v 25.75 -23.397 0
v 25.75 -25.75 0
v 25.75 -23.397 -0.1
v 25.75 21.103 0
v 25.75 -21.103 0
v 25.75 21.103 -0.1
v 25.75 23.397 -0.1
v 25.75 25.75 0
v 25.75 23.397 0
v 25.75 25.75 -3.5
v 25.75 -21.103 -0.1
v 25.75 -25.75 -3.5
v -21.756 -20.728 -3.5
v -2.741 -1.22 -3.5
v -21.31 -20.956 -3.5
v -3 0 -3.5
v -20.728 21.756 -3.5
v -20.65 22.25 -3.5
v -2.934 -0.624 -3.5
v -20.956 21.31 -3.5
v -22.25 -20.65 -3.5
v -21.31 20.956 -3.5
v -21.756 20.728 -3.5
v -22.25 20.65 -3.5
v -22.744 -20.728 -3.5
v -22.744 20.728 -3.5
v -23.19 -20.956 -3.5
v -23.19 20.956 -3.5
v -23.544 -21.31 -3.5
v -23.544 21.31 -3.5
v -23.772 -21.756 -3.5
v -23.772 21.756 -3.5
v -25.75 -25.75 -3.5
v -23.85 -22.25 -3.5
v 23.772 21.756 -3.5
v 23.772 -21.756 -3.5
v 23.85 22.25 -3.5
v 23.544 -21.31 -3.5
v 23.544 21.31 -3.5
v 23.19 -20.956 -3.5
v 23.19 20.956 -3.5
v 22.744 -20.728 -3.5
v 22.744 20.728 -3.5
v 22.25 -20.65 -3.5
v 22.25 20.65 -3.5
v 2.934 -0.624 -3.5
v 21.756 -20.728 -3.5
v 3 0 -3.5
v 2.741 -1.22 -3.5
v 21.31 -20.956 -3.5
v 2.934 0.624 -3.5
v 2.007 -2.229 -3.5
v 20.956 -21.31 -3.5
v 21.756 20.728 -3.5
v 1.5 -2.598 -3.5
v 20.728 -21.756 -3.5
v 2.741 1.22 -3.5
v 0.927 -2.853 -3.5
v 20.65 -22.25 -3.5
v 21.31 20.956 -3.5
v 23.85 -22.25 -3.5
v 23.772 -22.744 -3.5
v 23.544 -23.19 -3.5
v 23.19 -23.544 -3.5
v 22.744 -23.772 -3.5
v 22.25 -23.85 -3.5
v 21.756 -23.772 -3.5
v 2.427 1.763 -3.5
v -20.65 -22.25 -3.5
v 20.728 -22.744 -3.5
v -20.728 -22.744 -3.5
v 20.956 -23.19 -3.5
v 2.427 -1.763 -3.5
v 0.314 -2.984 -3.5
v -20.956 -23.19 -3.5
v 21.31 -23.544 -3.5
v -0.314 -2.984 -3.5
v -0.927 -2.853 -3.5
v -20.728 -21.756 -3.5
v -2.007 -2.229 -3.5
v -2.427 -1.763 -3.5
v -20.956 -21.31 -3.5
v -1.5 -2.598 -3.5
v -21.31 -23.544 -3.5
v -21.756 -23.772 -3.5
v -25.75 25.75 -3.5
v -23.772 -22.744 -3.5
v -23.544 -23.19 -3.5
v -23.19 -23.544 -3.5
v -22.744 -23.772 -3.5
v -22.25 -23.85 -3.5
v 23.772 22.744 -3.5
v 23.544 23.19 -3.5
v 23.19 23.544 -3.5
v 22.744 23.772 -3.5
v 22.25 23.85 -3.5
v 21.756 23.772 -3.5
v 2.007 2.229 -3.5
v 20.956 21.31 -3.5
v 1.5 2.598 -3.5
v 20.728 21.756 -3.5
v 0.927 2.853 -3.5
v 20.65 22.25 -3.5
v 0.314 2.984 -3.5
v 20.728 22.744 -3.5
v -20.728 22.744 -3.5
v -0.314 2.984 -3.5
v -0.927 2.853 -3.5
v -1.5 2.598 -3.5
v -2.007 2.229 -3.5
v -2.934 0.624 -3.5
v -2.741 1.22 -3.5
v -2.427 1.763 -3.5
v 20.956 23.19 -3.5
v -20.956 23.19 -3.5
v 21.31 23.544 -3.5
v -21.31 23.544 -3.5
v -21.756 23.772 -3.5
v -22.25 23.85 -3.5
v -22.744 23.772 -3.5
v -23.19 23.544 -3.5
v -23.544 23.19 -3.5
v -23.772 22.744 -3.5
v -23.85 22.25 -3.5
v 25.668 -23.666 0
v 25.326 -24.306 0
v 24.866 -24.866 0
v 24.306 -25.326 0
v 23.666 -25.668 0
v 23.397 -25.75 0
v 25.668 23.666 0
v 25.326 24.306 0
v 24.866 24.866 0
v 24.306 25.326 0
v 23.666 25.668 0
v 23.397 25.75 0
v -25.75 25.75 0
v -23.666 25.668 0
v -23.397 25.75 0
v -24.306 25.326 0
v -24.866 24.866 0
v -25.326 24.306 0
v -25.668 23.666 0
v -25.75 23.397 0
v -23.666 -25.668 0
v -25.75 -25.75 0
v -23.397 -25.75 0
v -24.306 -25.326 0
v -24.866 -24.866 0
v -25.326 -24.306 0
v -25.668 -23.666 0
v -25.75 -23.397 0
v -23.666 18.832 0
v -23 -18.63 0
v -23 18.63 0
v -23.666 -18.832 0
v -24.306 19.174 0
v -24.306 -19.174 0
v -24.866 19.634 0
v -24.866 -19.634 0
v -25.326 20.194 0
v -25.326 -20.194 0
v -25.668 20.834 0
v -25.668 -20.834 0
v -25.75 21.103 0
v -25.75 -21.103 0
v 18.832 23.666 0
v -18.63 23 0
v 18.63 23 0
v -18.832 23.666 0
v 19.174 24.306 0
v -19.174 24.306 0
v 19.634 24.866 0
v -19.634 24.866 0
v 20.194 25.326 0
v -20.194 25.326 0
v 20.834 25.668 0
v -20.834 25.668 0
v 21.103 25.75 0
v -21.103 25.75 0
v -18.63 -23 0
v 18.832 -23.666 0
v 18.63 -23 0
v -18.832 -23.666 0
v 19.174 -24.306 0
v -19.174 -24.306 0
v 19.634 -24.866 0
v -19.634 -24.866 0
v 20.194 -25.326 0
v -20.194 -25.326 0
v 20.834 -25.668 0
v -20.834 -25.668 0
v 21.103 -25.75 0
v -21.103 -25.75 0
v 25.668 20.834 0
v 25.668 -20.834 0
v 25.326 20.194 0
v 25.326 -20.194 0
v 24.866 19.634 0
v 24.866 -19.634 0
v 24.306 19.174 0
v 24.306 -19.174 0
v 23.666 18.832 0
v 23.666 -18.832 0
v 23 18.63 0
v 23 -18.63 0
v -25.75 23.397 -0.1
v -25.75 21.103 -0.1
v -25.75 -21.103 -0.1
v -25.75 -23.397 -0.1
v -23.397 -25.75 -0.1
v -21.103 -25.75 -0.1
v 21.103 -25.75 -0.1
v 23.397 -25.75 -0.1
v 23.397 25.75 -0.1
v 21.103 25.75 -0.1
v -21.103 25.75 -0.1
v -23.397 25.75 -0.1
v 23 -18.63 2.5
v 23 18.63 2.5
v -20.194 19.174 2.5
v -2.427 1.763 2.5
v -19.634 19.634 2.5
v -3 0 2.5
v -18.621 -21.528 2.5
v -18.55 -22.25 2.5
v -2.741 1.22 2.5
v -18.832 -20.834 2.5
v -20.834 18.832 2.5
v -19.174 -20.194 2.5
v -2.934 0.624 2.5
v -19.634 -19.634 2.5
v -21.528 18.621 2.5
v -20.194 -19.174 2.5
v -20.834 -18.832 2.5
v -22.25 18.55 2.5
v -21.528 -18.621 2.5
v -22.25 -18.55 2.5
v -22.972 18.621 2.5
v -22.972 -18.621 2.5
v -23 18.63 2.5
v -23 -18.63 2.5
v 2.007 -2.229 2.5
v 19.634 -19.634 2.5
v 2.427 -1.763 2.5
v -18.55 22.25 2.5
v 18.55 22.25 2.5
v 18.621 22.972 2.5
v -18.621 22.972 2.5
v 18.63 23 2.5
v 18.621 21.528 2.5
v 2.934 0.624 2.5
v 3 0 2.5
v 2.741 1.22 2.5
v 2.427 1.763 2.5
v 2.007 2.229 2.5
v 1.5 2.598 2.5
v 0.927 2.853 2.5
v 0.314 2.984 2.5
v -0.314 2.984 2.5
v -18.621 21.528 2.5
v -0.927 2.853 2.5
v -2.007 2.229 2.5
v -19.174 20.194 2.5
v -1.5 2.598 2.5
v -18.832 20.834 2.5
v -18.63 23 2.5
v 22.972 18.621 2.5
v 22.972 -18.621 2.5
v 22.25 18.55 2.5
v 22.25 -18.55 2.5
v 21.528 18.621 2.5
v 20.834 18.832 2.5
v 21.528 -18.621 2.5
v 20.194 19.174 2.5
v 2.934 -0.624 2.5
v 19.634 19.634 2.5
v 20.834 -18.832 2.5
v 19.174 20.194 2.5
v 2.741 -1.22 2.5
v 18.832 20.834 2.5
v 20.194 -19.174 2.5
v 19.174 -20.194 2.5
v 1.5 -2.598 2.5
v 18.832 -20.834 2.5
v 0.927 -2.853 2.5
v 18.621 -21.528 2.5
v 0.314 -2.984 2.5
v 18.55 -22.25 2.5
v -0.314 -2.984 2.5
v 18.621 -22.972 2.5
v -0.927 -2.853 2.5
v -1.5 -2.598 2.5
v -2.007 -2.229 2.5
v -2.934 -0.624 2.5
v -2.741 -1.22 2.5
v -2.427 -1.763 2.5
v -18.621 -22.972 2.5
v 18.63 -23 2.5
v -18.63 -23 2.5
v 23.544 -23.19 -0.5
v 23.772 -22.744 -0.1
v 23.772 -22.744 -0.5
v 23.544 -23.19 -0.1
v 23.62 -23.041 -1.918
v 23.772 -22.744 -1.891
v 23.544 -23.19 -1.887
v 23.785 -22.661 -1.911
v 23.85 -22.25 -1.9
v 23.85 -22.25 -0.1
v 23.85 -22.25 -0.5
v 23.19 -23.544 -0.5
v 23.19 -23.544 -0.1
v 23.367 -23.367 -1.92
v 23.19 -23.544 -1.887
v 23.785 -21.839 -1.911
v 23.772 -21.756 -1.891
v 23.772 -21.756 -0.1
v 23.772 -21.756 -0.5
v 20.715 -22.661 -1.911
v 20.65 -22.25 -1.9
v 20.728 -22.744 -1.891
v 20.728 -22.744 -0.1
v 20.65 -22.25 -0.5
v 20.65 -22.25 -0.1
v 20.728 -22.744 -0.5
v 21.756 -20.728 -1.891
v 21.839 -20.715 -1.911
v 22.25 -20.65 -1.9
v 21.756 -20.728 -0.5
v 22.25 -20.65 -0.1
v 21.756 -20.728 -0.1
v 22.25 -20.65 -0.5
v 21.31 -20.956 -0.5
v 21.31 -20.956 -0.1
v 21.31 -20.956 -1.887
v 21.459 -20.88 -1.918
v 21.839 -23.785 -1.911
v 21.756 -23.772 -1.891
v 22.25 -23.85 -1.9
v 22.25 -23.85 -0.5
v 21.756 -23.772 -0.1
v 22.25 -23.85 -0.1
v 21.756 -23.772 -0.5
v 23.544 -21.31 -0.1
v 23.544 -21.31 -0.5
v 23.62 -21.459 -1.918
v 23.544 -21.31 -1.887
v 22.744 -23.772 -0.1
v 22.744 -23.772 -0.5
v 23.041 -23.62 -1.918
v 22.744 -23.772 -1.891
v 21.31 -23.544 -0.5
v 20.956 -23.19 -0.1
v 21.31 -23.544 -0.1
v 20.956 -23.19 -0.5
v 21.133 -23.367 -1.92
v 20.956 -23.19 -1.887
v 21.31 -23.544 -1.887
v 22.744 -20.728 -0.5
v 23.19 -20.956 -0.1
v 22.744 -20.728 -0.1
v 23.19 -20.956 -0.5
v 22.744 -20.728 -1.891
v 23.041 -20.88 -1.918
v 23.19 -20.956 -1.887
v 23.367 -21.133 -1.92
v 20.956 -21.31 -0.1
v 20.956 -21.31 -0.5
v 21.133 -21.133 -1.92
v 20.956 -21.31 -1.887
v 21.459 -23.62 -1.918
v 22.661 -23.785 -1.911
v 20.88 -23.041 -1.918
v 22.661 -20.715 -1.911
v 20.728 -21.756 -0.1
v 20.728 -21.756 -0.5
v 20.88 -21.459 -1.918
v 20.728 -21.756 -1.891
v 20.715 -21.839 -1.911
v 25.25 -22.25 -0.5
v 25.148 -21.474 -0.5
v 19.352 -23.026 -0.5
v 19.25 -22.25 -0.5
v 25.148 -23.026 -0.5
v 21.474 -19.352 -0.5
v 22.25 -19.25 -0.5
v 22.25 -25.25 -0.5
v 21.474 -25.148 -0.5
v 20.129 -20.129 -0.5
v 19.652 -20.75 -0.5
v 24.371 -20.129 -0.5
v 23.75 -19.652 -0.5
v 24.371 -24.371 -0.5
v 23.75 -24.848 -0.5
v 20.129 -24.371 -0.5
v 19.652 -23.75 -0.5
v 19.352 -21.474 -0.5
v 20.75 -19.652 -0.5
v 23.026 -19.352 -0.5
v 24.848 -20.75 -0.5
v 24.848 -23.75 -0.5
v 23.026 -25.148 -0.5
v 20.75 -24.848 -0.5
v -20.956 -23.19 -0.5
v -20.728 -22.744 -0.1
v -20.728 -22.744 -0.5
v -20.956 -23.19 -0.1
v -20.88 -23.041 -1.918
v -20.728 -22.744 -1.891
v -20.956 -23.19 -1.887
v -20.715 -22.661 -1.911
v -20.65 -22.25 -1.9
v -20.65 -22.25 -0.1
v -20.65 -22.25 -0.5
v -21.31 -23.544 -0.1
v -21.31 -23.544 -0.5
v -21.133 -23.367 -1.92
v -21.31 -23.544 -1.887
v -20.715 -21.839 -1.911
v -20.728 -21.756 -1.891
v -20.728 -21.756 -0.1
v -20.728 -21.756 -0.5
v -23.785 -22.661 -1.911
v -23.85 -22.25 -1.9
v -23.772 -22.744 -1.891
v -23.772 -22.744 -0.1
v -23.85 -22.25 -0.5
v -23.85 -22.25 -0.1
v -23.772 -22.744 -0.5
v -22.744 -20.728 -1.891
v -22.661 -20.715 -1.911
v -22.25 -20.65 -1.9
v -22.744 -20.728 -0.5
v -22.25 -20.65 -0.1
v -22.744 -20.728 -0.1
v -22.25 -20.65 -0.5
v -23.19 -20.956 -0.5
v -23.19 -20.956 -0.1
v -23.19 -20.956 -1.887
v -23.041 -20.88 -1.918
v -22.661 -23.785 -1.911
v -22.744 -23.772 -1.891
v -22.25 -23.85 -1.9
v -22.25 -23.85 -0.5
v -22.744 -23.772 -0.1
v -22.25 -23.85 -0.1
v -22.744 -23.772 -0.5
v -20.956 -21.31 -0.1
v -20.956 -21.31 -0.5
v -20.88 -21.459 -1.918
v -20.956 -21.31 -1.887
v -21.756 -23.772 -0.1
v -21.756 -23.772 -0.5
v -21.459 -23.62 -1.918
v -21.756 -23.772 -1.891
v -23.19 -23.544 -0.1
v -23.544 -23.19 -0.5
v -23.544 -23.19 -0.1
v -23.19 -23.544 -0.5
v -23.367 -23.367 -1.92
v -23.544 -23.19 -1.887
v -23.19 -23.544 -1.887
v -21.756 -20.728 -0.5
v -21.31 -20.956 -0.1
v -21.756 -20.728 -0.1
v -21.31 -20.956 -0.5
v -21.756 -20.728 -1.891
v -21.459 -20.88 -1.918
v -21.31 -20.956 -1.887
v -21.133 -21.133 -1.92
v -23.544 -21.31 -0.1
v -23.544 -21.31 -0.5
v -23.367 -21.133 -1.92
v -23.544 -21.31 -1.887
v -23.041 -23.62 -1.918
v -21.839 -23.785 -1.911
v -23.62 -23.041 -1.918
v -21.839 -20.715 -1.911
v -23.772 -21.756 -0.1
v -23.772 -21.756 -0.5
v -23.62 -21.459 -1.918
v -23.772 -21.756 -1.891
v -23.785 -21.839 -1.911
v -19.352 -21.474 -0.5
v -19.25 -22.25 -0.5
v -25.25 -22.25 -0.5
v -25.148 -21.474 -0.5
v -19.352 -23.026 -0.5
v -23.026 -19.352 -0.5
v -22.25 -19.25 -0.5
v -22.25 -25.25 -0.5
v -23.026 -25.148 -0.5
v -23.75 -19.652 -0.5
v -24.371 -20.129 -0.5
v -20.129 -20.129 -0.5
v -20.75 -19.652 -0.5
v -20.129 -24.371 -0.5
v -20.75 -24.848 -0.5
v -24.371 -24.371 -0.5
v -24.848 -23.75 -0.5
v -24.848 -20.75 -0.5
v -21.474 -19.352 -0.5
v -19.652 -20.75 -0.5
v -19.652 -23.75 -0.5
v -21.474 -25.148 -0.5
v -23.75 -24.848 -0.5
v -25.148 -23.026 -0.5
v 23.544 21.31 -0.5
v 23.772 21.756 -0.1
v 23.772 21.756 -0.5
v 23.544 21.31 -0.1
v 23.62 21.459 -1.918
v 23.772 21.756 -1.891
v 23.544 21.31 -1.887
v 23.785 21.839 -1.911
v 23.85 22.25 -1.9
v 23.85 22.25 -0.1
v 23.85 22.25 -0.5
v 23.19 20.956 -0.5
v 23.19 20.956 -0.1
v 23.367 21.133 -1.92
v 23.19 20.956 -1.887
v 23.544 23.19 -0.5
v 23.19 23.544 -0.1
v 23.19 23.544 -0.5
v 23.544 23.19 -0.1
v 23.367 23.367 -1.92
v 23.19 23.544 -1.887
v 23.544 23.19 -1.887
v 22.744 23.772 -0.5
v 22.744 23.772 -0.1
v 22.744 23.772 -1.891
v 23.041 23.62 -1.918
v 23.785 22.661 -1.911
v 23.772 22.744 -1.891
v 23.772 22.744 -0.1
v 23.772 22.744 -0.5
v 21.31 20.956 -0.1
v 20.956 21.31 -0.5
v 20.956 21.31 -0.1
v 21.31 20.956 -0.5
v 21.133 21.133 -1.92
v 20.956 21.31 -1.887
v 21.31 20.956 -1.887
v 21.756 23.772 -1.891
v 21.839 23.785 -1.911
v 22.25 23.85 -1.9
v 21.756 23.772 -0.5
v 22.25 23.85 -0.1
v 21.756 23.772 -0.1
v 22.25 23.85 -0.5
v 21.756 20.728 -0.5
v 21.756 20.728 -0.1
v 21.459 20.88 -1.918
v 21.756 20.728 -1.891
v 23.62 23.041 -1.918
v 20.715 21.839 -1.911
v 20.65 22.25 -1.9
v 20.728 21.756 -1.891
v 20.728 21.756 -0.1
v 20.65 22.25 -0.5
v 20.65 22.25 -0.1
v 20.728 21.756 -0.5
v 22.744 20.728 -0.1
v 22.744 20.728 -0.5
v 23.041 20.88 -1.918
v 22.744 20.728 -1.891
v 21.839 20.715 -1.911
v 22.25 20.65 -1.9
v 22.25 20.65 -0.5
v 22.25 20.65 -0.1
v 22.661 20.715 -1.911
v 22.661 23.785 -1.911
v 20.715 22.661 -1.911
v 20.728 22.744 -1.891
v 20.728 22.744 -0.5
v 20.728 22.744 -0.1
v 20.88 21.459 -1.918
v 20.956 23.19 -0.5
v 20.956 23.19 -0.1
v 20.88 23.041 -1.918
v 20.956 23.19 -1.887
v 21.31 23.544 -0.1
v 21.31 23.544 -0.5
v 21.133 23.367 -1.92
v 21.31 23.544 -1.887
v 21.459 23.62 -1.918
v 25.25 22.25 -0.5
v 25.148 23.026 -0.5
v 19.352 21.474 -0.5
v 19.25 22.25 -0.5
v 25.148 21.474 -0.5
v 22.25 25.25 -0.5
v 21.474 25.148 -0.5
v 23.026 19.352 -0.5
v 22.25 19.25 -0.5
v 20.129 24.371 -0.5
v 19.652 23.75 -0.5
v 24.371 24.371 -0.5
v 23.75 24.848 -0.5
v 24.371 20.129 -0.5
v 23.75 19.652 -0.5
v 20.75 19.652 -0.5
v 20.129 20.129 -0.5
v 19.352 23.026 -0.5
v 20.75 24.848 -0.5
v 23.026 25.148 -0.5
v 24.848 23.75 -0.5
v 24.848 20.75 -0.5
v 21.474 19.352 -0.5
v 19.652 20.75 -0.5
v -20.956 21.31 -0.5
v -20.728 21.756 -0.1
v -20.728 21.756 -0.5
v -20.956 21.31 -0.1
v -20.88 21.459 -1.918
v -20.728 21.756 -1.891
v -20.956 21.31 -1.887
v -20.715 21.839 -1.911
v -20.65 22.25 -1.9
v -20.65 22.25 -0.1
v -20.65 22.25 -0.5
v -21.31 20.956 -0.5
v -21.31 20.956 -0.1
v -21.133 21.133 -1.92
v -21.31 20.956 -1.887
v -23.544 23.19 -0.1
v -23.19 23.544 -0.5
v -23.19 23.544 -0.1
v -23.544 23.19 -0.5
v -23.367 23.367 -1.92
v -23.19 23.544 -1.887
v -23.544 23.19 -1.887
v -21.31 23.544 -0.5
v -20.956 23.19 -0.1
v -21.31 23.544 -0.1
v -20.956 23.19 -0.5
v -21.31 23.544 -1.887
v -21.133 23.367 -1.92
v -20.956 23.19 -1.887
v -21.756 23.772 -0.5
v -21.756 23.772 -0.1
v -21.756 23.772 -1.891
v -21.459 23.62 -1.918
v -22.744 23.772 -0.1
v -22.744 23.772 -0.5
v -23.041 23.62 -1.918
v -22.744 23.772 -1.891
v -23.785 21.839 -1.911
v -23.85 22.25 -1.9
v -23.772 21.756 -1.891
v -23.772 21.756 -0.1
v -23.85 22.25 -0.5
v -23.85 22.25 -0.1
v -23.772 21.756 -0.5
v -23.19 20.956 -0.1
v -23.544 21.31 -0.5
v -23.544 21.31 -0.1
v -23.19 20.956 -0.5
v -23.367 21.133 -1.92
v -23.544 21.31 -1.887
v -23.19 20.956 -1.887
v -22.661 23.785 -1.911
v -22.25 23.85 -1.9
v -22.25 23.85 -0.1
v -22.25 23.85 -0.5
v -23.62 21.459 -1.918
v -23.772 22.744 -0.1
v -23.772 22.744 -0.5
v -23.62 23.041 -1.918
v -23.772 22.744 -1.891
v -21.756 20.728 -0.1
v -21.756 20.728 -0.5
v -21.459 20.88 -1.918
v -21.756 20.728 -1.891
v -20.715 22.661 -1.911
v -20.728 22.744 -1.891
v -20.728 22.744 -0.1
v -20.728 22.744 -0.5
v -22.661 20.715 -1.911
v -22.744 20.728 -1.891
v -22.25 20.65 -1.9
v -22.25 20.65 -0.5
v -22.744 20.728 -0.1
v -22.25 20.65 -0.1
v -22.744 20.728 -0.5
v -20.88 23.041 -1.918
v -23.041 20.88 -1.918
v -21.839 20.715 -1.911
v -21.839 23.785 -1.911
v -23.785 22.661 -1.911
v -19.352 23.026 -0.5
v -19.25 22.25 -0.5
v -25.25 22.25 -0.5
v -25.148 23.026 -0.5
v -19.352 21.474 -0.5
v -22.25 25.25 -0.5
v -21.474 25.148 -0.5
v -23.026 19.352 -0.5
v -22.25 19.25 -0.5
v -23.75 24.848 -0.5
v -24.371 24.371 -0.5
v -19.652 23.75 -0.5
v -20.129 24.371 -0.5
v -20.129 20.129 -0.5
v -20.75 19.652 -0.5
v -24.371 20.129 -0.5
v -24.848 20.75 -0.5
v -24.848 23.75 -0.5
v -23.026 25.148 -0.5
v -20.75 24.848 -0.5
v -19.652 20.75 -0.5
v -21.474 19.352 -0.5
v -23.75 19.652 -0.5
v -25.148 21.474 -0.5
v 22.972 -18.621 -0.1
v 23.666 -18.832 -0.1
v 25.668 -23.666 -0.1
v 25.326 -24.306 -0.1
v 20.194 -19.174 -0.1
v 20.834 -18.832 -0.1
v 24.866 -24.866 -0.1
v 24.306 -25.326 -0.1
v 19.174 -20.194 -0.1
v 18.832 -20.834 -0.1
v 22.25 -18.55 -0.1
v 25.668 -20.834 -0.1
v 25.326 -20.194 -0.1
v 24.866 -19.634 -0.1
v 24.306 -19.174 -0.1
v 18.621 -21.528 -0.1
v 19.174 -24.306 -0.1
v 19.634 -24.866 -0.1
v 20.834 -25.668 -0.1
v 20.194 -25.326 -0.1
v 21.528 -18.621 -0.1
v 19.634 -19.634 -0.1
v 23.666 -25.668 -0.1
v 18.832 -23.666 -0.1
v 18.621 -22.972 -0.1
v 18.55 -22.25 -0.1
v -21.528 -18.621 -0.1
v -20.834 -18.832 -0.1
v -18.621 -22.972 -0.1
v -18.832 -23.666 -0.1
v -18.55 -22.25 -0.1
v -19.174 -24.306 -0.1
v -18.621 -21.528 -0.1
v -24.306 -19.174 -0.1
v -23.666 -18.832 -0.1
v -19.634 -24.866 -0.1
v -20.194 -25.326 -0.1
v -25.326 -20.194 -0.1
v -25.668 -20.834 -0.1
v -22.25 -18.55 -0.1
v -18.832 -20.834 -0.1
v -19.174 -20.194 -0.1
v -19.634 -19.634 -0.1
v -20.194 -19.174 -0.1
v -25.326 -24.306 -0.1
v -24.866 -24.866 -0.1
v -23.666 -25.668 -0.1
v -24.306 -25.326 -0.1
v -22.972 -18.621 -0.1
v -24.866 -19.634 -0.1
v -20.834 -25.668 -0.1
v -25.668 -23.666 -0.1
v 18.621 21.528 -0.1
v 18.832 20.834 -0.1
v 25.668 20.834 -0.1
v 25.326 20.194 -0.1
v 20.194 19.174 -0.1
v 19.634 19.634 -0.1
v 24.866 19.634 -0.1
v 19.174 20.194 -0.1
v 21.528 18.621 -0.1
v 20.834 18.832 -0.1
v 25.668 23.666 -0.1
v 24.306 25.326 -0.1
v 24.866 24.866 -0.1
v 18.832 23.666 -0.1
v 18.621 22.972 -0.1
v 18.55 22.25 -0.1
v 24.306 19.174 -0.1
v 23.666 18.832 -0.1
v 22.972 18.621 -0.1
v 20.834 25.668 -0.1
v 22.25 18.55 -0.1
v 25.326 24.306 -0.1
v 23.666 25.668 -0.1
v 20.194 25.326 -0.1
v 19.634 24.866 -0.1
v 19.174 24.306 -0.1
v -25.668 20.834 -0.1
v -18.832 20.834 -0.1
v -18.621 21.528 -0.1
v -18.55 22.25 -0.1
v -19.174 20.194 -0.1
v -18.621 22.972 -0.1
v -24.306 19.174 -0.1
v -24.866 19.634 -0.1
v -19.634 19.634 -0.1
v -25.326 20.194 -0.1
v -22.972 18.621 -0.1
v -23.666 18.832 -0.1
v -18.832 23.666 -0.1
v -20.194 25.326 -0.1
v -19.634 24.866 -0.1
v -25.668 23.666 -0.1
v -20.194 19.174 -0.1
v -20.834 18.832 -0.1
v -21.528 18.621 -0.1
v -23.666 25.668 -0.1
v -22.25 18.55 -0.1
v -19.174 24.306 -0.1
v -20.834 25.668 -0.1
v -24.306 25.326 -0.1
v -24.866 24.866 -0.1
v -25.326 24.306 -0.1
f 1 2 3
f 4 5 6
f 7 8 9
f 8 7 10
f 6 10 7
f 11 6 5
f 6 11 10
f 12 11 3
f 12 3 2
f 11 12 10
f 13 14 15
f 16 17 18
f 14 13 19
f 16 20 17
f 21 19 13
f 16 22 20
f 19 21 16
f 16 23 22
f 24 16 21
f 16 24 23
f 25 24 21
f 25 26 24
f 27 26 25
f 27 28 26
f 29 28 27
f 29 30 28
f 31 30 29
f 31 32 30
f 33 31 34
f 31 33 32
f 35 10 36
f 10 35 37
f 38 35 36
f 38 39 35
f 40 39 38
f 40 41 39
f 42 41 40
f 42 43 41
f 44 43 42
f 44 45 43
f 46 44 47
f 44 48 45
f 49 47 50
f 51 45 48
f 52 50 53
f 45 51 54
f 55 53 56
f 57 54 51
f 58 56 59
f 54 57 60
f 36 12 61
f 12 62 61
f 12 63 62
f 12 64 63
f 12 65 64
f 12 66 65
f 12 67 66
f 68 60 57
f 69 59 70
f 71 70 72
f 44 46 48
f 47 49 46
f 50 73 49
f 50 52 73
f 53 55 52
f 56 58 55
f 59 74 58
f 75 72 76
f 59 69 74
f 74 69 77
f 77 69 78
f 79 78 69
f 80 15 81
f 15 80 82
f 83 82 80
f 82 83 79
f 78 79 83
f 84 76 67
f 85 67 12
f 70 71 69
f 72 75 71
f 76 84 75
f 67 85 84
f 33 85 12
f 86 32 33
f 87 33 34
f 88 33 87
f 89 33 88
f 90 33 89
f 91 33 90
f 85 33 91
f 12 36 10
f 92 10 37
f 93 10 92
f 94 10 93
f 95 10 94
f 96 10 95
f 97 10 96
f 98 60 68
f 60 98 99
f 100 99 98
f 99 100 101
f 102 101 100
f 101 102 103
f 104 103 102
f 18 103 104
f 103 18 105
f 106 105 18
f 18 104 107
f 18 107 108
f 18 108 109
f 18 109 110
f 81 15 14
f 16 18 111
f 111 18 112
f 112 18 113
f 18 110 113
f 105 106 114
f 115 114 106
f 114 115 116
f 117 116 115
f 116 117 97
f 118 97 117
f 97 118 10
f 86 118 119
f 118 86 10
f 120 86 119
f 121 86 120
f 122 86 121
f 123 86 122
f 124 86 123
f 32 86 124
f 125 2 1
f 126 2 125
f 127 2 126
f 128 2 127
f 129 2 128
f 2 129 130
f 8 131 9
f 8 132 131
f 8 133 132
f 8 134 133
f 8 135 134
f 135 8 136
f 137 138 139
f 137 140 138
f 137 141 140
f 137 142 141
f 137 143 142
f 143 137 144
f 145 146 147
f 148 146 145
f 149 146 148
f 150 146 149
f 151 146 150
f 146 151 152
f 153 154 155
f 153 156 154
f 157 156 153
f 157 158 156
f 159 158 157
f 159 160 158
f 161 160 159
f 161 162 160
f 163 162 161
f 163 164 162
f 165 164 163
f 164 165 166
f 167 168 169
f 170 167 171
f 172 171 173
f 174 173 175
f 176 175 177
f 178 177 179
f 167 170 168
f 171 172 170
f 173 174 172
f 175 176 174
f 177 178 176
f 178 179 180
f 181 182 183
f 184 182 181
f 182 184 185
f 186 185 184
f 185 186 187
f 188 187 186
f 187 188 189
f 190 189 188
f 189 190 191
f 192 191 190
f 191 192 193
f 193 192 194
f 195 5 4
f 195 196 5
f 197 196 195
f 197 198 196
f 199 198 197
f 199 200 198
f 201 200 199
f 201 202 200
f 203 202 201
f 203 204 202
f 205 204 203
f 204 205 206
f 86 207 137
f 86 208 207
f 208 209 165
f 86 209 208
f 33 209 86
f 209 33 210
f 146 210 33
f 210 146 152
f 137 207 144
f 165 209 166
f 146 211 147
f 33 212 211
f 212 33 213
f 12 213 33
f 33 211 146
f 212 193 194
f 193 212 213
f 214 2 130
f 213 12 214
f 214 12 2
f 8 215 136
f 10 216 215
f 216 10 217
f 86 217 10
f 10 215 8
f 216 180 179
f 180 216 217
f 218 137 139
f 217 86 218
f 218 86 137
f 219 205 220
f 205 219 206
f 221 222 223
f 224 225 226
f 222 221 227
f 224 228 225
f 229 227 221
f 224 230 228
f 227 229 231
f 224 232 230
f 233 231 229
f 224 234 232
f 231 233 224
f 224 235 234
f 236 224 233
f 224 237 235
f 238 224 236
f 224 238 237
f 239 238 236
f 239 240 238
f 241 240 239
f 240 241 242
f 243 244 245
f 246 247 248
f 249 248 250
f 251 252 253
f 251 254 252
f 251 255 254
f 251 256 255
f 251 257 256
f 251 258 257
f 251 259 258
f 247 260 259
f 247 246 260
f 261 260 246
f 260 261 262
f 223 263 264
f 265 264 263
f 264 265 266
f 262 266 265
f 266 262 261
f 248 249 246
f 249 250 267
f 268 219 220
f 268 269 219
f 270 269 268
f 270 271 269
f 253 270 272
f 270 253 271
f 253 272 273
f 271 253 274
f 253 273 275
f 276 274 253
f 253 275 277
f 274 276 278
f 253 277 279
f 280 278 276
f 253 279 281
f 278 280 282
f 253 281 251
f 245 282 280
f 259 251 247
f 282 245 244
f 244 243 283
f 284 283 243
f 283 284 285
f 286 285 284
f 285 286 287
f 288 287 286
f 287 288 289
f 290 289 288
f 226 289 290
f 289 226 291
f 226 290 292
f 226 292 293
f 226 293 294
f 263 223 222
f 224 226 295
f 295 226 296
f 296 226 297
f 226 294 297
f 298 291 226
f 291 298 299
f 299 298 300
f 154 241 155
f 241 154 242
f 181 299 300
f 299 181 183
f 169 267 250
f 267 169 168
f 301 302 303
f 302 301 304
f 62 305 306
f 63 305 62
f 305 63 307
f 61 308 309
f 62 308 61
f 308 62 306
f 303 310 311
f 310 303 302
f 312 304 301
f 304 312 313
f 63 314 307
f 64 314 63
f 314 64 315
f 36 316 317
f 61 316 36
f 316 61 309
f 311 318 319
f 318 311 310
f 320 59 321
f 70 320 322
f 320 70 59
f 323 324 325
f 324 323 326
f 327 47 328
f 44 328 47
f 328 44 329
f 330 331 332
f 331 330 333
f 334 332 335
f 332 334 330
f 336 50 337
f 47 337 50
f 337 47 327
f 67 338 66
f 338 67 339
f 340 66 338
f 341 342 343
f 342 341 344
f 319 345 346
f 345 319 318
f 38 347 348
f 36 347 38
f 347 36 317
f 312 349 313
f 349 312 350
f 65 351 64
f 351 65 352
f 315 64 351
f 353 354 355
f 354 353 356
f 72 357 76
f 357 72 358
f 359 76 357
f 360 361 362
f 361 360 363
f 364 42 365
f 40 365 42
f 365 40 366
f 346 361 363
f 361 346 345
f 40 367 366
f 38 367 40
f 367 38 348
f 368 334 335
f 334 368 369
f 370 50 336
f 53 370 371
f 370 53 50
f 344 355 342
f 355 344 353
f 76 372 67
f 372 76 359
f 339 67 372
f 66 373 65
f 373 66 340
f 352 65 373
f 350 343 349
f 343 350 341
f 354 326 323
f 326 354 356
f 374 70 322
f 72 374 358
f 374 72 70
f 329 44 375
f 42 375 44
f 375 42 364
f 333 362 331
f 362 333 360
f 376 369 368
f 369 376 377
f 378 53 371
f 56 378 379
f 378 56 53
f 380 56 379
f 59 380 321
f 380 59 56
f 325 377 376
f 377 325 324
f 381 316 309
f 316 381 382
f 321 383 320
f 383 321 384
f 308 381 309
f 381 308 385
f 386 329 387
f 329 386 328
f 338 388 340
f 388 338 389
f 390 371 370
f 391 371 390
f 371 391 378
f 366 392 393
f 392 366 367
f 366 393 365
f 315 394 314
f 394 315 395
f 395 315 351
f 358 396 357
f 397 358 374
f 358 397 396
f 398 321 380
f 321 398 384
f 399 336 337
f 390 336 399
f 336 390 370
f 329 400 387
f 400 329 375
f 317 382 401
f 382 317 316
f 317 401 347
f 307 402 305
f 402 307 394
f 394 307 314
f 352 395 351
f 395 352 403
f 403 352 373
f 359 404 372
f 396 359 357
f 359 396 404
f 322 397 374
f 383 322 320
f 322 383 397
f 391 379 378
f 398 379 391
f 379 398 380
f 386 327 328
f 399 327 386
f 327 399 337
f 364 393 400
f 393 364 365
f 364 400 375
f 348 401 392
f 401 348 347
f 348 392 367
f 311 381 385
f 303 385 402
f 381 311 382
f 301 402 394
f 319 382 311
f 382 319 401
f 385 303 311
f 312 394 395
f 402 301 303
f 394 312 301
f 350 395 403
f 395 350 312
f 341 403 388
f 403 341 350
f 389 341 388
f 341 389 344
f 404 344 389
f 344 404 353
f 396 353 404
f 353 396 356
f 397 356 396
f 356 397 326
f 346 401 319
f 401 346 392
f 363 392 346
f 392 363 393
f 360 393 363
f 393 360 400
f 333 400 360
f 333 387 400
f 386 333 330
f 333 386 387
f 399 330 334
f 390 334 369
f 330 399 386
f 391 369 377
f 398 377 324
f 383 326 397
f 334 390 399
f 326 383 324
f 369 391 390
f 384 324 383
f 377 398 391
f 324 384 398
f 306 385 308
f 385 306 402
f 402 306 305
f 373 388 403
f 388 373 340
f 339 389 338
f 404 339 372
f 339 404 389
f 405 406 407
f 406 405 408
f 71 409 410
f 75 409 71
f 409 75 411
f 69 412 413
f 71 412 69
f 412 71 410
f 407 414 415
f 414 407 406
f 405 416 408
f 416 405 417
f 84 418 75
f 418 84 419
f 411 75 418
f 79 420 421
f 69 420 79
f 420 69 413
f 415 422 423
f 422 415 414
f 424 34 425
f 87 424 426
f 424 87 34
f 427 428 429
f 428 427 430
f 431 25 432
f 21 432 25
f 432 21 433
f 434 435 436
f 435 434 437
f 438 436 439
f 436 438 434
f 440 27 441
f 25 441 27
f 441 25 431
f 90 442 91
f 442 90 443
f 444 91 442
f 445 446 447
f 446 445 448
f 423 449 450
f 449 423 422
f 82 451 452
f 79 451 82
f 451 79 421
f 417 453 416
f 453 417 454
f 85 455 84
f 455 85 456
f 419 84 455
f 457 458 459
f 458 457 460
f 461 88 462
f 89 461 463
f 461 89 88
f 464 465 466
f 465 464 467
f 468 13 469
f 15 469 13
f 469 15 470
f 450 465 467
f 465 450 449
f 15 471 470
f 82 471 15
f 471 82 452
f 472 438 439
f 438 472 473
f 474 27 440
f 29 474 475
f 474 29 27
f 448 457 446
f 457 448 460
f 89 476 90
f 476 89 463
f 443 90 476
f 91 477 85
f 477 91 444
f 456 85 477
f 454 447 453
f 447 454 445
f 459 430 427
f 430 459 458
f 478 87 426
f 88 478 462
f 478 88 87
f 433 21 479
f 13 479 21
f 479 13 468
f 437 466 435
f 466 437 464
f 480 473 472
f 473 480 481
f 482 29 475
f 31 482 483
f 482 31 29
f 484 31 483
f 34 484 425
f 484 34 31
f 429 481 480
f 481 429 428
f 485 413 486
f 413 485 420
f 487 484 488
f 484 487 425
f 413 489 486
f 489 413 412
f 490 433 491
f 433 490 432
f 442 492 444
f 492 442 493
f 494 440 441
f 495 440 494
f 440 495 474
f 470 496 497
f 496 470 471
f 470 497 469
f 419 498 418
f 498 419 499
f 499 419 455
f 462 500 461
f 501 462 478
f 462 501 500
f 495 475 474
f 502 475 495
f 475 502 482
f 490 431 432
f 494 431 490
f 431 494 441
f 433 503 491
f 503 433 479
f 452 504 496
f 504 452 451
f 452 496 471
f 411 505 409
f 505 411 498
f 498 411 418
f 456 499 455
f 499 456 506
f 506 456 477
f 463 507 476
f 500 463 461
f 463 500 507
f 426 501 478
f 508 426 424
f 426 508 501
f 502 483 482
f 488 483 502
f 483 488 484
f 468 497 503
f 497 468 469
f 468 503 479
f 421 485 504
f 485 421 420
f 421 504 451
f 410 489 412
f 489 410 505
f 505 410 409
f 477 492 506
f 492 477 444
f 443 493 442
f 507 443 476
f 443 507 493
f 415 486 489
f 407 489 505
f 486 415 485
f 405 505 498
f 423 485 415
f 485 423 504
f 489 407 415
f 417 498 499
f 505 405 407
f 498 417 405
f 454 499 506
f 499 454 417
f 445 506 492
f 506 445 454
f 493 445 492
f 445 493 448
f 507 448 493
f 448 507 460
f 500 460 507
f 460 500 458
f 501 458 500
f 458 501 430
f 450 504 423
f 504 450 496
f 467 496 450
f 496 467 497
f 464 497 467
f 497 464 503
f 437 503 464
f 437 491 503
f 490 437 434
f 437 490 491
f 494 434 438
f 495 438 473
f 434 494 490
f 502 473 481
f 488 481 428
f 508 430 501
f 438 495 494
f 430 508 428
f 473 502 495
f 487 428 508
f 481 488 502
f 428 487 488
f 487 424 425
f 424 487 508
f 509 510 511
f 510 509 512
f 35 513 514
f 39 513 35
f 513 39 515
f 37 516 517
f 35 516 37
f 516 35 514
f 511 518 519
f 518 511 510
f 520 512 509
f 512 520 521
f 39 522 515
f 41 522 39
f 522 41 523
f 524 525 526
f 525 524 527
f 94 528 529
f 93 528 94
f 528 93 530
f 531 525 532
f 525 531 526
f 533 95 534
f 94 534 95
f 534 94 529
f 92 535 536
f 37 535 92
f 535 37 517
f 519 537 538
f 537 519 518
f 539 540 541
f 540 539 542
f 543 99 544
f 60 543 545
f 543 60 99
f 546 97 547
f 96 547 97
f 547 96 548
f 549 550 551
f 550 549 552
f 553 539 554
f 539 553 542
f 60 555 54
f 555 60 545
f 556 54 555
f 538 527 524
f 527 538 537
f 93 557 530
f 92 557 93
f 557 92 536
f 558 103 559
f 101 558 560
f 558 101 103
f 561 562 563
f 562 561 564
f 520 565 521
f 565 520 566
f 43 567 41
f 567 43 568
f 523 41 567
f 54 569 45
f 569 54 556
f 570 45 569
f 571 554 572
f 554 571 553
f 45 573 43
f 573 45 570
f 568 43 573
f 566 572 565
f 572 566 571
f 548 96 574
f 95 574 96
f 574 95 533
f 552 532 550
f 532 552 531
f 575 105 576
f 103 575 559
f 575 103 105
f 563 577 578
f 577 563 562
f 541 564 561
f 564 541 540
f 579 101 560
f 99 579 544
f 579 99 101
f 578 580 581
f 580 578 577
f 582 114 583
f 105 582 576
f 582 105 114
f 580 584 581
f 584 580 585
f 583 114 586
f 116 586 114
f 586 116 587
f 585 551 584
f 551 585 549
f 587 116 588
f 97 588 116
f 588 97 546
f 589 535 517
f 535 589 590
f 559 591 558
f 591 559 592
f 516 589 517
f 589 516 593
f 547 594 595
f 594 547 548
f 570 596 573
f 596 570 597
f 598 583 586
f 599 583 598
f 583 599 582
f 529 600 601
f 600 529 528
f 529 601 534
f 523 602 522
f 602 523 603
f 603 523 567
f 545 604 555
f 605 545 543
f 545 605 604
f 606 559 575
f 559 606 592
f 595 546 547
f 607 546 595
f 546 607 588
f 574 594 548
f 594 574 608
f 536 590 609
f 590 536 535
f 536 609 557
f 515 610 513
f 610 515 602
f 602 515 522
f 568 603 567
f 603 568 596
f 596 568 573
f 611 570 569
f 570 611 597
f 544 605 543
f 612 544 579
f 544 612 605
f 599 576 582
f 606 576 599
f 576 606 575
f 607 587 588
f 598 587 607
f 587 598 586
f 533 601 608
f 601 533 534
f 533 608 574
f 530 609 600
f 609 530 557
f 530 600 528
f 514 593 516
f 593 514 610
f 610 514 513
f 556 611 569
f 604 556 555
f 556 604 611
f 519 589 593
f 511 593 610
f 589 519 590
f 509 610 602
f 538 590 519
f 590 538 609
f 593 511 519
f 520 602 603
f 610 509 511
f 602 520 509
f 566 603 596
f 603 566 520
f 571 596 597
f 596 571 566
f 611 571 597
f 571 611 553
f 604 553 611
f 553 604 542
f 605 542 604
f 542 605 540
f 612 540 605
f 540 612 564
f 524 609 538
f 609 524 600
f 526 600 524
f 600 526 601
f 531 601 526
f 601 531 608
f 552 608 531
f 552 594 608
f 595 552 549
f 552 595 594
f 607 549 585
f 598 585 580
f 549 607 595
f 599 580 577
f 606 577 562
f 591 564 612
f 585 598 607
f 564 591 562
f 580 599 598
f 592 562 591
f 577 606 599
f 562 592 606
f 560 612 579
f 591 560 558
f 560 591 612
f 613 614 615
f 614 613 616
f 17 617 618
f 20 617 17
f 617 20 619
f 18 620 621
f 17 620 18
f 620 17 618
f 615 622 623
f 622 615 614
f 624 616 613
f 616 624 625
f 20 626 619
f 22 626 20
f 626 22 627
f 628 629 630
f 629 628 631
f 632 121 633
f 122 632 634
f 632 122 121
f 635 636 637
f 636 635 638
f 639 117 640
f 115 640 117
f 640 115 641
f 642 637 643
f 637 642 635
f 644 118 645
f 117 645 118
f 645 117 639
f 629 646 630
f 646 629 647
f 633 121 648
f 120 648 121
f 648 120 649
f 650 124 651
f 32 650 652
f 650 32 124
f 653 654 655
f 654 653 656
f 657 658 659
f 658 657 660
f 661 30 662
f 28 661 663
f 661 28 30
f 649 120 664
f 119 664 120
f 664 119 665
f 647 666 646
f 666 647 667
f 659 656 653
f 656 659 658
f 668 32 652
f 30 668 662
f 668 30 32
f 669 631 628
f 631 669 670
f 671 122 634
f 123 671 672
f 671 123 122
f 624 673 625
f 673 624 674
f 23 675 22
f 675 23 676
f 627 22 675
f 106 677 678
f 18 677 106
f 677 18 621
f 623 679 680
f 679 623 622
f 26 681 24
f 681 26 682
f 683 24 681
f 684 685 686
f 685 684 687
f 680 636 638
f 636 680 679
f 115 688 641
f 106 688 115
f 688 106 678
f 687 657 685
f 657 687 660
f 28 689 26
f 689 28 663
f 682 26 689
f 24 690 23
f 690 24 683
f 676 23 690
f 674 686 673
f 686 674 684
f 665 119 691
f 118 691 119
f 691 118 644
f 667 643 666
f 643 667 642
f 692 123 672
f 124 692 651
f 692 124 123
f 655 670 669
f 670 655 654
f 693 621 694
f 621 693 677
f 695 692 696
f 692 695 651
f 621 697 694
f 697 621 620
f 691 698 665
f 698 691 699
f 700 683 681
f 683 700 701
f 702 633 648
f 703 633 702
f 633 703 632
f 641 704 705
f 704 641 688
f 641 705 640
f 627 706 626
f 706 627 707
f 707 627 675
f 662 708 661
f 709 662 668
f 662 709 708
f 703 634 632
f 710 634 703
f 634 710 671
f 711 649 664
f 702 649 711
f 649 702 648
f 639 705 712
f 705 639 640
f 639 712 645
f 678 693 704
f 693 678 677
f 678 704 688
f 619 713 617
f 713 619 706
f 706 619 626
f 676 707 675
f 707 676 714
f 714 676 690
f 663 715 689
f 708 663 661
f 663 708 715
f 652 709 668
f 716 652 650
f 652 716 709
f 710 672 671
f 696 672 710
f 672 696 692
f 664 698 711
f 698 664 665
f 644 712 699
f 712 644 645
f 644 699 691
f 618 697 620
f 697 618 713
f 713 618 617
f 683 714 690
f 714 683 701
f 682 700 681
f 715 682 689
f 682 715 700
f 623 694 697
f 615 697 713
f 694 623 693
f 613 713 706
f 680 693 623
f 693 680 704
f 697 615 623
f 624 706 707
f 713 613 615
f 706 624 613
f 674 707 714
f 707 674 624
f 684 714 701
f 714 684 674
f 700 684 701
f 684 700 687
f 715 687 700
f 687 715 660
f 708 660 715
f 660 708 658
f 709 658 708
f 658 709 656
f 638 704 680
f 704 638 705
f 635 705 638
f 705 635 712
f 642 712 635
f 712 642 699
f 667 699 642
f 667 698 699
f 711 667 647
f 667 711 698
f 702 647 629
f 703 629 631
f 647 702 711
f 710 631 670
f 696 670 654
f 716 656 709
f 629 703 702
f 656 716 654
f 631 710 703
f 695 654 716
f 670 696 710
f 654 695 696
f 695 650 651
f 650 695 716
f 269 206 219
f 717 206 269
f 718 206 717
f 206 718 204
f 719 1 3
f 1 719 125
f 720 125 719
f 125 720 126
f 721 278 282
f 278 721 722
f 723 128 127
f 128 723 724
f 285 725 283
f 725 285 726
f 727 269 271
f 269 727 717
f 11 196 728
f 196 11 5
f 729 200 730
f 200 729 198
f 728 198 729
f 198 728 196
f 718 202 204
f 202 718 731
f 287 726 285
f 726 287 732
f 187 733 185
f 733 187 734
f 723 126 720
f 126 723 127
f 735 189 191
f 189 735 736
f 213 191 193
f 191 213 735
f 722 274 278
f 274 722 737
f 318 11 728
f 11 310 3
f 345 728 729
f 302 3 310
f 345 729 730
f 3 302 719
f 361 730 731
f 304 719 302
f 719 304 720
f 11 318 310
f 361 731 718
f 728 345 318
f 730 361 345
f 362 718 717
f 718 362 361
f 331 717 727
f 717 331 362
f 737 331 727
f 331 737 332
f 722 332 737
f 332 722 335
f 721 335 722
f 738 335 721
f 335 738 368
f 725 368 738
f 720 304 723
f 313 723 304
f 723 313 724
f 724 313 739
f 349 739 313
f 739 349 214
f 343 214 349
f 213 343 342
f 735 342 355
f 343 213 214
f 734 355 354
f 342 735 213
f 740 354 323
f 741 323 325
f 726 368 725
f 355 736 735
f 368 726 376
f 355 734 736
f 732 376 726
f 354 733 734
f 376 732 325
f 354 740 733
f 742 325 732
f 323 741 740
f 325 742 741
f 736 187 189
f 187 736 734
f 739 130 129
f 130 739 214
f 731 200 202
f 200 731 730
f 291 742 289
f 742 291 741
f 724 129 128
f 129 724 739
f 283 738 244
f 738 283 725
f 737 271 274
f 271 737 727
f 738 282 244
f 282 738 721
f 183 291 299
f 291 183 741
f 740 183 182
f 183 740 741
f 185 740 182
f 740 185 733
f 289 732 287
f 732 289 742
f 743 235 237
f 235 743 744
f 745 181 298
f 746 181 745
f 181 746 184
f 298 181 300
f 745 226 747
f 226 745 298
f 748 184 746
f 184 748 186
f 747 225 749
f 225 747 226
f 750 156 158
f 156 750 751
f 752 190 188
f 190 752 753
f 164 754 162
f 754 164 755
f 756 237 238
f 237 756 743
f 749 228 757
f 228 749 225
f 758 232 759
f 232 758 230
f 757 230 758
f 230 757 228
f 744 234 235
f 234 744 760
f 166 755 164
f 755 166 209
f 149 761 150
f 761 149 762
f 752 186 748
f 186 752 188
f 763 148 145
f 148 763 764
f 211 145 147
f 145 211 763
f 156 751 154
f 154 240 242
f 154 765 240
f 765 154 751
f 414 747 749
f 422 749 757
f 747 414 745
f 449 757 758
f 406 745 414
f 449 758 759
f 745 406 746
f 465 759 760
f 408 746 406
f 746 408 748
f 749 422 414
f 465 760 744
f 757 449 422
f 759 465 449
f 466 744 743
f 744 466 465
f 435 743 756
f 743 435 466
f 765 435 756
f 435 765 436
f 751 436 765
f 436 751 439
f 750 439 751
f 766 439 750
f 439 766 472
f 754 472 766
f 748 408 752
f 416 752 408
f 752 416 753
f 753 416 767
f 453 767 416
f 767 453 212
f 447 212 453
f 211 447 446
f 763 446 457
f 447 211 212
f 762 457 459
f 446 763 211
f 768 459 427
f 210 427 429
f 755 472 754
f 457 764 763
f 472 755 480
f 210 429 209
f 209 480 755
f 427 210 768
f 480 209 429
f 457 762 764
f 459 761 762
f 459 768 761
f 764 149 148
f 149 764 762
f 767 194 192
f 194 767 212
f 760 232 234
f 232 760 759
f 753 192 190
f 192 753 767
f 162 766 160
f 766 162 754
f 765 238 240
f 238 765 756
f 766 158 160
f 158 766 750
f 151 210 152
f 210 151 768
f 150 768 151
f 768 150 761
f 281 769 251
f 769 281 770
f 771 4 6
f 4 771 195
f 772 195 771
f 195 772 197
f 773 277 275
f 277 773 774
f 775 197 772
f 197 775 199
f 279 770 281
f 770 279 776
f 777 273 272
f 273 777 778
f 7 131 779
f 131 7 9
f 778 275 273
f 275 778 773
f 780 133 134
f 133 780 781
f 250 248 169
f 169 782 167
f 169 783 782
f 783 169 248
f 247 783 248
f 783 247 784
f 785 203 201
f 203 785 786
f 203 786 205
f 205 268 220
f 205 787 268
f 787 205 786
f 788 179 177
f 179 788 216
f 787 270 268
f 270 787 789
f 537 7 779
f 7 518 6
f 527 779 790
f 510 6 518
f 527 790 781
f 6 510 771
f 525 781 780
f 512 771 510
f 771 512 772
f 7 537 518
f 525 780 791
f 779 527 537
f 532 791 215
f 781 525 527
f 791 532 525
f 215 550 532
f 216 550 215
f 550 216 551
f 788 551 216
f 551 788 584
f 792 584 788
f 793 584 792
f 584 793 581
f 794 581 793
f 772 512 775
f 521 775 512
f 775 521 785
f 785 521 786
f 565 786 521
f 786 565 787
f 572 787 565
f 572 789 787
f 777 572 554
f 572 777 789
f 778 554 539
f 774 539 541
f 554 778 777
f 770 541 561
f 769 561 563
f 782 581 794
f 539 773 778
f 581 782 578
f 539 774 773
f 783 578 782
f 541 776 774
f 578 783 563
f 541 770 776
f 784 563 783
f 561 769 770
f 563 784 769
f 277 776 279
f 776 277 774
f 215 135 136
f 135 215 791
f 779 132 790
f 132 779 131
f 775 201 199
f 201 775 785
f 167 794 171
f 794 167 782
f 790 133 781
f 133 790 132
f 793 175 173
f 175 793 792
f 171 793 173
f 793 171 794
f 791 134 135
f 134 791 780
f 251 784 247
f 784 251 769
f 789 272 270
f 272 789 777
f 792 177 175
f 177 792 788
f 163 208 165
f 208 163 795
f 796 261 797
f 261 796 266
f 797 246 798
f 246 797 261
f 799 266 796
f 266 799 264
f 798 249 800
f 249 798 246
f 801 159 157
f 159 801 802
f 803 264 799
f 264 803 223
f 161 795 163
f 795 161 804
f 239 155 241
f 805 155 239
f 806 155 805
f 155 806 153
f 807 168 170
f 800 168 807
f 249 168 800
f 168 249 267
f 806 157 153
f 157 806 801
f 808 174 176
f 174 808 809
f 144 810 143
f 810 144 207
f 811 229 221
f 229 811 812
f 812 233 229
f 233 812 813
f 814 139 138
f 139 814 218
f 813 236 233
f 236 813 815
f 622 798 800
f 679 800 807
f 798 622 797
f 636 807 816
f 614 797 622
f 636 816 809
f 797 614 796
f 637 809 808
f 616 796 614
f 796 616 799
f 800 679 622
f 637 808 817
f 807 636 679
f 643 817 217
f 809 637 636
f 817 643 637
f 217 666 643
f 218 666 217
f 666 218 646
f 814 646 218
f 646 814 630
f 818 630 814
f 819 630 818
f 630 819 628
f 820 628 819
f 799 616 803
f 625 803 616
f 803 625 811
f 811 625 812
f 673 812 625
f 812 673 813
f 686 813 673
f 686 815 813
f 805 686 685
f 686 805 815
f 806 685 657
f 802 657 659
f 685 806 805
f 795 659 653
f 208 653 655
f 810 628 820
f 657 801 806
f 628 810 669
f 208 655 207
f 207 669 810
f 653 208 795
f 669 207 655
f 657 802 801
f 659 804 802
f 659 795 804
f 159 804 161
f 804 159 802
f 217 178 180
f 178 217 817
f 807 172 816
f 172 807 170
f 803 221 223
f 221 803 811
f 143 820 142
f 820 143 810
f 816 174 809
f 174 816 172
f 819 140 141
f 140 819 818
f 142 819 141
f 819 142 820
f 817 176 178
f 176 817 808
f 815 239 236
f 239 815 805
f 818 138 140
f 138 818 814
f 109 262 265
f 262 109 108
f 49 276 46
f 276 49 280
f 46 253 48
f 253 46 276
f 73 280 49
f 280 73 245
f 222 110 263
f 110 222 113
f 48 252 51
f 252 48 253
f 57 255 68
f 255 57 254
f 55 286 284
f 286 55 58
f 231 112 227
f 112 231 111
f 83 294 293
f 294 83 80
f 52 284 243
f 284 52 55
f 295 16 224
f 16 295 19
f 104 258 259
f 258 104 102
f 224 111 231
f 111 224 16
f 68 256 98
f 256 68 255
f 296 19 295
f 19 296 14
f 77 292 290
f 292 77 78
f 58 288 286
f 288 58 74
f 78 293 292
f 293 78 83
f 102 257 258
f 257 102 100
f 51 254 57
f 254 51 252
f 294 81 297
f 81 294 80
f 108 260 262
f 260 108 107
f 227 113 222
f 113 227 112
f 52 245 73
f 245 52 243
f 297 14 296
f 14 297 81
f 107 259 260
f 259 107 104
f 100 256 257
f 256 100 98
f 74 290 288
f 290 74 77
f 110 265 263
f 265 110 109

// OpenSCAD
// file: station_battery_params.scad
// ============================================================
// АКУСТИЧНА СТАНЦІЯ — Спільні параметри акумуляторного відсіку
// ------------------------------------------------------------
// НЕ рендерити напряму. Підключати через:
//   include <station_battery_params.scad>
// Використовується у:
//   station_battery_mount.scad  — корпус + кріплення кілка
//   station_battery_lid.scad    — кришка
// ============================================================

// --- ПАРАМЕТРИ (змінюй тут) ---------------------------------

// Елемент 21700
cell_d       = 21.0;   // діаметр елемента
cell_l       = 70.0;   // довжина елемента
cell_gap     = 1.5;    // зазор між елементами
wall         = 2.5;    // товщина стінки
floor_h      = 3.0;    // товщина дна

// Кришка
lid_h        = 3.5;    // товщина кришки
lid_lip_h    = 2.5;    // висота центрувального бортику кришки
lid_lip_gap  = 0.25;   // зазор бортику (посадка ковзання)

// Кілок
stake_d      = 12.0;   // діаметр арматури
stake_hole   = 12.6;   // отвір з зазором
stake_depth  = 50.0;   // глибина посадки
stake_wall   = 4.0;    // товщина стінки кріплення кілка

// Хомут (пази)
hose_w       = 8.0;    // ширина пазу під хомут
hose_d       = 3.0;    // глибина пазу
hose_count   = 2;      // кількість пазів

// Гвинти М3
screw_d      = 3.2;    // наскрізний отвір у кришці (М3 clearance)
screw_tap_d  = 2.7;    // глухий отвір у бобишці (різьба М3 у пластик)
screw_head_d = 6.0;    // зенківка під голівку М3
screw_head_h = 3.0;    // глибина зенківки
screw_depth  = 12.0;   // глибина глухого отвору в бобишці
boss_d       = 7.0;    // діаметр внутрішньої кутової бобишки

// Дріт між відсіками
wire_hole_d  = 6.0;    // отвір для дротів у кришці

// --- РОЗРАХУНКОВІ РОЗМІРИ -----------------------------------

// 2×2 блок акумуляторів
block_x = cell_d * 2 + cell_gap * 3;   // ~46.5мм
block_y = cell_d * 2 + cell_gap * 3;   // ~46.5мм

// Внутрішній розмір відсіку
inner_x = block_x;
inner_y = block_y;
inner_z = cell_l + 4.0;   // +2мм з кожного боку

// Зовнішній розмір відсіку
outer_x = inner_x + wall * 2;
outer_y = inner_y + wall * 2;
body_z  = inner_z + floor_h;   // висота корпусу (без кришки)

// Кріплення кілка
mount_od = stake_hole + stake_wall * 2;
mount_h  = stake_depth + 10.0;   // +10мм над землею

// Позиції бобишок — внутрішні кутові колонки
// Центр бобишки врівень із зовнішньою стінкою; колонка виступає в порожнину.
// Зазор від поверхні осередку: ~1.4мм. Стінка М3: ~2.2мм.
boss_pos = [
    [ outer_x/2 - boss_d/2,  outer_y/2 - boss_d/2],
    [-outer_x/2 + boss_d/2,  outer_y/2 - boss_d/2],
    [ outer_x/2 - boss_d/2, -outer_y/2 + boss_d/2],
    [-outer_x/2 + boss_d/2, -outer_y/2 + boss_d/2]
];

echo("=== РОЗМІРИ ВІДСІКУ ===");
echo("Зовнішній X:", outer_x, "мм");
echo("Зовнішній Y:", outer_y, "мм");
echo("Корпус Z:", body_z, "мм  (без кришки)");
echo("Кришка Z:", lid_h, "мм");
echo("Загальна висота:", body_z + lid_h, "мм");
echo("Блок акумуляторів:", block_x, "×", block_y, "мм");
echo("======================");
// main file
// ============================================================
// АКУСТИЧНА СТАНЦІЯ — Кришка акумуляторного відсіку
// ------------------------------------------------------------
// Плоска плита + центрувальний бортик знизу, що входить у порожнину корпусу.
// Кріплення: 4× М3×16 у внутрішні кутові бобишки корпусу.
// Матеріал друку: PETG або ASA
// Шар: 0.2мм, заповнення 40%, периметри 3
//
// Параметри: station_battery_params.scad
// Корпус:    station_battery_mount.scad
// ============================================================

include <station_battery_params.scad>

// --- МОДУЛЬ -------------------------------------------------

module battery_lid() {
    // Ширина бортику (вписується у внутрішню порожнину з зазором lid_lip_gap)
    lip_x = inner_x - lid_lip_gap * 2;
    lip_y = inner_y - lid_lip_gap * 2;

    difference() {
        union() {
            // Плита кришки
            translate([-outer_x/2, -outer_y/2, 0])
            cube([outer_x, outer_y, lid_h]);

            // Центрувальний бортик (виступає вниз, входить у корпус)
            translate([-lip_x/2, -lip_y/2, -lid_lip_h])
            cube([lip_x, lip_y, lid_lip_h]);
        }

        // Отвір для дротів до електронного відсіку (центр)
        translate([0, 0, -lid_lip_h - 0.1])
        cylinder(d = wire_hole_d, h = lid_h + lid_lip_h + 0.2, $fn = 30);

        // М3 наскрізні отвори + зенківка під голівку гвинта (зверху кришки)
        for (p = boss_pos) {
            // Наскрізний отвір
            translate([p[0], p[1], -lid_lip_h - 0.1])
            cylinder(d = screw_d, h = lid_h + lid_lip_h + 0.2, $fn = 20);
            // Конічна зенківка 90° (M3 DIN 965, голівка Ø6мм, глибина 3мм)
            translate([p[0], p[1], lid_h])
            rotate([180, 0, 0])
            cylinder(d1 = 0, d2 = screw_head_d, h = screw_head_d / 2, $fn = 24);
        }

        // Вирізи у бортику під бобишки корпусу (бортик їх обходить)
        for (p = boss_pos)
            translate([p[0], p[1], -lid_lip_h - 0.1])
            cylinder(d = boss_d + 0.4, h = lid_lip_h + 0.2, $fn = 32);
    }
}

// --- ВИВІД ДЛЯ СЛАЙСЕРА -------------------------------------

// Кришку друкувати плитою на стіл (бортик дивиться вгору при друці)
rotate([180, 0, 0])
battery_lid();

// ============================================================
// ПРИМІТКИ ДЛЯ ДРУКУ:
// - Орієнтація: плитою на стіл (бортик догори)
// - Підтримки: не потрібні
// - Заповнення: 40% gyroid, периметри 3
// ============================================================
